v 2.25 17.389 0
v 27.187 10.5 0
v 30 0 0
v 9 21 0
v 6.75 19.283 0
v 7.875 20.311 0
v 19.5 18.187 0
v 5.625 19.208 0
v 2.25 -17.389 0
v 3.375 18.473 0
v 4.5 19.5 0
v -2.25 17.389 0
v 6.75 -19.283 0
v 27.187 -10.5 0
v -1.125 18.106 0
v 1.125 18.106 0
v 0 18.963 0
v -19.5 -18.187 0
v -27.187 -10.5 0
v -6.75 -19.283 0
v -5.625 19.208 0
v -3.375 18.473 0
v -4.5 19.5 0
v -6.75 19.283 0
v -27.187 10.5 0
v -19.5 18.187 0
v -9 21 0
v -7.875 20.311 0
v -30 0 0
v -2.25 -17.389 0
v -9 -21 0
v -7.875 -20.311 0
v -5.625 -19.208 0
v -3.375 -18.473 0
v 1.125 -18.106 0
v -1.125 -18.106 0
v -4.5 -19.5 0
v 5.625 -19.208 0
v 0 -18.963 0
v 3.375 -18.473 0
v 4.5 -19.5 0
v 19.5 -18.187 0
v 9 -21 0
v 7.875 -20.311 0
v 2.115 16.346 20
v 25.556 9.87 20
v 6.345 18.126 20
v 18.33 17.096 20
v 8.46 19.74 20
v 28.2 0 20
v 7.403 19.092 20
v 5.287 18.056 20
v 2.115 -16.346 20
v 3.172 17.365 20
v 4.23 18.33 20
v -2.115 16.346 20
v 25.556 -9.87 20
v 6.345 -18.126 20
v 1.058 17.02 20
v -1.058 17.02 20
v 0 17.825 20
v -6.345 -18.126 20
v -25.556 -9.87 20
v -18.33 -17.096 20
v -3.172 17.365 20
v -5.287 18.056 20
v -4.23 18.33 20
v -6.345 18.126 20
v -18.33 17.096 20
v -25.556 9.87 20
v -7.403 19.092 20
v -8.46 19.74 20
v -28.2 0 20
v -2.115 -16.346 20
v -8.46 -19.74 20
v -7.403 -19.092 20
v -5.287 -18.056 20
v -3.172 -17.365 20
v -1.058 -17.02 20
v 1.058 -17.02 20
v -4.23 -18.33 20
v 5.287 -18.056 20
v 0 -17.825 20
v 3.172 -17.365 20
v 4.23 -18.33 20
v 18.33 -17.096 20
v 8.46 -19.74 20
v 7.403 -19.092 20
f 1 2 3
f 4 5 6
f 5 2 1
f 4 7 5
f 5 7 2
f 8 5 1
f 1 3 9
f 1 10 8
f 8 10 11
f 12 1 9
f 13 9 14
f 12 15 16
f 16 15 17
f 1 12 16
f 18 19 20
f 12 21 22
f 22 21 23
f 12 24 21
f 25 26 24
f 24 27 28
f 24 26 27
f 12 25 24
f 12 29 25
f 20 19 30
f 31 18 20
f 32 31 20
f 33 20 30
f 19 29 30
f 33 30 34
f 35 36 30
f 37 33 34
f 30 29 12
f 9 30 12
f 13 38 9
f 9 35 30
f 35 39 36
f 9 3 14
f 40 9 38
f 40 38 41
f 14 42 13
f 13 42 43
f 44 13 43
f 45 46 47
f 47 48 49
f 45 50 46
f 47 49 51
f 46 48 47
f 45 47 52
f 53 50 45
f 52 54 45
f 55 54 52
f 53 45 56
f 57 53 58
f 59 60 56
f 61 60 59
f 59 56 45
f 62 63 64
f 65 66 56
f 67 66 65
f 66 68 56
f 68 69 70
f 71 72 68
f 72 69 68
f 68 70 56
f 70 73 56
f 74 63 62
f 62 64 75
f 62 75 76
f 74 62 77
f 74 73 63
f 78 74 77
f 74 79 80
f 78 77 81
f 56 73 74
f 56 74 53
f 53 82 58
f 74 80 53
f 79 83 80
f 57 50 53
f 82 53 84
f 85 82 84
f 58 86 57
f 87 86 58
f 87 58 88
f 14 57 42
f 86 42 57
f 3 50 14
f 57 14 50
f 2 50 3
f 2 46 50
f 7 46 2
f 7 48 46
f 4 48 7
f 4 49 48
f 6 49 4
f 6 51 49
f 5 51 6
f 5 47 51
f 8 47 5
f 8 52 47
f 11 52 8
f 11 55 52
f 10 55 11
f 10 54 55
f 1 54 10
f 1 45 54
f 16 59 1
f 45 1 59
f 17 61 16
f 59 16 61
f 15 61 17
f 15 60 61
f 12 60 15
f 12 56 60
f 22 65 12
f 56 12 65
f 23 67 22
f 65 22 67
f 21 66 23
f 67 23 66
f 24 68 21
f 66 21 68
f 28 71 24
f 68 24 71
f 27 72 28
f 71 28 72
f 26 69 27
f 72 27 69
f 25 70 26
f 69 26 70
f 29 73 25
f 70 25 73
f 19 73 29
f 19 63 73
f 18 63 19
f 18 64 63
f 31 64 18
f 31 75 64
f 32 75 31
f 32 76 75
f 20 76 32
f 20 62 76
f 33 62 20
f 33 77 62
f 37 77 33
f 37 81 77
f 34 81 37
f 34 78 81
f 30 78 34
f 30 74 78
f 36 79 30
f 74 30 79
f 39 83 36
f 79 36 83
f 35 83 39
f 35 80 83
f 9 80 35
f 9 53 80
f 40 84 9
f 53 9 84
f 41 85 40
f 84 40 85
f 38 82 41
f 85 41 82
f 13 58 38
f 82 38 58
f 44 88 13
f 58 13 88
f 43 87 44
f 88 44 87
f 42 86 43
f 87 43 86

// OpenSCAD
$fn = 32;

// ----------------------------------------------------------------------
// Handle: 60 x 42 mm grip, 20 mm thick
// ----------------------------------------------------------------------

// --- parameters (mm) ---
length = 60;              // grip length
width = 42;               // grip width
thickness = 20;           // grip thickness
waist = 0.86;             // width factor at the middle
draft = 0.94;             // top face scale of the extrusion
scallops = 4;             // finger rests per side
ripple = 0.05;            // depth factor of the finger rests

/* ergonomic grip outline, closed spline-like polygon in the XY plane */
grip = [[-9, 21], [-7.875, 20.311], [-6.75, 19.283], [-5.625, 19.208], [-4.5, 19.5], [-3.375, 18.473], [-2.25, 17.389], [-1.125, 18.106], [0, 18.963], [1.125, 18.106], [2.25, 17.389], [3.375, 18.473], [4.5, 19.5], [5.625, 19.208], [6.75, 19.283], [7.875, 20.311], [9, 21], [19.5, 18.187], [27.187, 10.5], [30, 0], [27.187, -10.5], [19.5, -18.187], [9, -21], [9, -21], [7.875, -20.311], [6.75, -19.283], [5.625, -19.208], [4.5, -19.5], [3.375, -18.473], [2.25, -17.389], [1.125, -18.106], [0, -18.963], [-1.125, -18.106], [-2.25, -17.389], [-3.375, -18.473], [-4.5, -19.5], [-5.625, -19.208], [-6.75, -19.283], [-7.875, -20.311], [-9, -21], [-19.5, -18.187], [-27.187, -10.5], [-30, 0], [-27.187, 10.5], [-19.5, 18.187], [-9, 21]];

module grip_body() {
  linear_extrude(height = thickness, scale = draft) polygon(grip);
}

difference() {
  union() {
    grip_body();
  }
}
